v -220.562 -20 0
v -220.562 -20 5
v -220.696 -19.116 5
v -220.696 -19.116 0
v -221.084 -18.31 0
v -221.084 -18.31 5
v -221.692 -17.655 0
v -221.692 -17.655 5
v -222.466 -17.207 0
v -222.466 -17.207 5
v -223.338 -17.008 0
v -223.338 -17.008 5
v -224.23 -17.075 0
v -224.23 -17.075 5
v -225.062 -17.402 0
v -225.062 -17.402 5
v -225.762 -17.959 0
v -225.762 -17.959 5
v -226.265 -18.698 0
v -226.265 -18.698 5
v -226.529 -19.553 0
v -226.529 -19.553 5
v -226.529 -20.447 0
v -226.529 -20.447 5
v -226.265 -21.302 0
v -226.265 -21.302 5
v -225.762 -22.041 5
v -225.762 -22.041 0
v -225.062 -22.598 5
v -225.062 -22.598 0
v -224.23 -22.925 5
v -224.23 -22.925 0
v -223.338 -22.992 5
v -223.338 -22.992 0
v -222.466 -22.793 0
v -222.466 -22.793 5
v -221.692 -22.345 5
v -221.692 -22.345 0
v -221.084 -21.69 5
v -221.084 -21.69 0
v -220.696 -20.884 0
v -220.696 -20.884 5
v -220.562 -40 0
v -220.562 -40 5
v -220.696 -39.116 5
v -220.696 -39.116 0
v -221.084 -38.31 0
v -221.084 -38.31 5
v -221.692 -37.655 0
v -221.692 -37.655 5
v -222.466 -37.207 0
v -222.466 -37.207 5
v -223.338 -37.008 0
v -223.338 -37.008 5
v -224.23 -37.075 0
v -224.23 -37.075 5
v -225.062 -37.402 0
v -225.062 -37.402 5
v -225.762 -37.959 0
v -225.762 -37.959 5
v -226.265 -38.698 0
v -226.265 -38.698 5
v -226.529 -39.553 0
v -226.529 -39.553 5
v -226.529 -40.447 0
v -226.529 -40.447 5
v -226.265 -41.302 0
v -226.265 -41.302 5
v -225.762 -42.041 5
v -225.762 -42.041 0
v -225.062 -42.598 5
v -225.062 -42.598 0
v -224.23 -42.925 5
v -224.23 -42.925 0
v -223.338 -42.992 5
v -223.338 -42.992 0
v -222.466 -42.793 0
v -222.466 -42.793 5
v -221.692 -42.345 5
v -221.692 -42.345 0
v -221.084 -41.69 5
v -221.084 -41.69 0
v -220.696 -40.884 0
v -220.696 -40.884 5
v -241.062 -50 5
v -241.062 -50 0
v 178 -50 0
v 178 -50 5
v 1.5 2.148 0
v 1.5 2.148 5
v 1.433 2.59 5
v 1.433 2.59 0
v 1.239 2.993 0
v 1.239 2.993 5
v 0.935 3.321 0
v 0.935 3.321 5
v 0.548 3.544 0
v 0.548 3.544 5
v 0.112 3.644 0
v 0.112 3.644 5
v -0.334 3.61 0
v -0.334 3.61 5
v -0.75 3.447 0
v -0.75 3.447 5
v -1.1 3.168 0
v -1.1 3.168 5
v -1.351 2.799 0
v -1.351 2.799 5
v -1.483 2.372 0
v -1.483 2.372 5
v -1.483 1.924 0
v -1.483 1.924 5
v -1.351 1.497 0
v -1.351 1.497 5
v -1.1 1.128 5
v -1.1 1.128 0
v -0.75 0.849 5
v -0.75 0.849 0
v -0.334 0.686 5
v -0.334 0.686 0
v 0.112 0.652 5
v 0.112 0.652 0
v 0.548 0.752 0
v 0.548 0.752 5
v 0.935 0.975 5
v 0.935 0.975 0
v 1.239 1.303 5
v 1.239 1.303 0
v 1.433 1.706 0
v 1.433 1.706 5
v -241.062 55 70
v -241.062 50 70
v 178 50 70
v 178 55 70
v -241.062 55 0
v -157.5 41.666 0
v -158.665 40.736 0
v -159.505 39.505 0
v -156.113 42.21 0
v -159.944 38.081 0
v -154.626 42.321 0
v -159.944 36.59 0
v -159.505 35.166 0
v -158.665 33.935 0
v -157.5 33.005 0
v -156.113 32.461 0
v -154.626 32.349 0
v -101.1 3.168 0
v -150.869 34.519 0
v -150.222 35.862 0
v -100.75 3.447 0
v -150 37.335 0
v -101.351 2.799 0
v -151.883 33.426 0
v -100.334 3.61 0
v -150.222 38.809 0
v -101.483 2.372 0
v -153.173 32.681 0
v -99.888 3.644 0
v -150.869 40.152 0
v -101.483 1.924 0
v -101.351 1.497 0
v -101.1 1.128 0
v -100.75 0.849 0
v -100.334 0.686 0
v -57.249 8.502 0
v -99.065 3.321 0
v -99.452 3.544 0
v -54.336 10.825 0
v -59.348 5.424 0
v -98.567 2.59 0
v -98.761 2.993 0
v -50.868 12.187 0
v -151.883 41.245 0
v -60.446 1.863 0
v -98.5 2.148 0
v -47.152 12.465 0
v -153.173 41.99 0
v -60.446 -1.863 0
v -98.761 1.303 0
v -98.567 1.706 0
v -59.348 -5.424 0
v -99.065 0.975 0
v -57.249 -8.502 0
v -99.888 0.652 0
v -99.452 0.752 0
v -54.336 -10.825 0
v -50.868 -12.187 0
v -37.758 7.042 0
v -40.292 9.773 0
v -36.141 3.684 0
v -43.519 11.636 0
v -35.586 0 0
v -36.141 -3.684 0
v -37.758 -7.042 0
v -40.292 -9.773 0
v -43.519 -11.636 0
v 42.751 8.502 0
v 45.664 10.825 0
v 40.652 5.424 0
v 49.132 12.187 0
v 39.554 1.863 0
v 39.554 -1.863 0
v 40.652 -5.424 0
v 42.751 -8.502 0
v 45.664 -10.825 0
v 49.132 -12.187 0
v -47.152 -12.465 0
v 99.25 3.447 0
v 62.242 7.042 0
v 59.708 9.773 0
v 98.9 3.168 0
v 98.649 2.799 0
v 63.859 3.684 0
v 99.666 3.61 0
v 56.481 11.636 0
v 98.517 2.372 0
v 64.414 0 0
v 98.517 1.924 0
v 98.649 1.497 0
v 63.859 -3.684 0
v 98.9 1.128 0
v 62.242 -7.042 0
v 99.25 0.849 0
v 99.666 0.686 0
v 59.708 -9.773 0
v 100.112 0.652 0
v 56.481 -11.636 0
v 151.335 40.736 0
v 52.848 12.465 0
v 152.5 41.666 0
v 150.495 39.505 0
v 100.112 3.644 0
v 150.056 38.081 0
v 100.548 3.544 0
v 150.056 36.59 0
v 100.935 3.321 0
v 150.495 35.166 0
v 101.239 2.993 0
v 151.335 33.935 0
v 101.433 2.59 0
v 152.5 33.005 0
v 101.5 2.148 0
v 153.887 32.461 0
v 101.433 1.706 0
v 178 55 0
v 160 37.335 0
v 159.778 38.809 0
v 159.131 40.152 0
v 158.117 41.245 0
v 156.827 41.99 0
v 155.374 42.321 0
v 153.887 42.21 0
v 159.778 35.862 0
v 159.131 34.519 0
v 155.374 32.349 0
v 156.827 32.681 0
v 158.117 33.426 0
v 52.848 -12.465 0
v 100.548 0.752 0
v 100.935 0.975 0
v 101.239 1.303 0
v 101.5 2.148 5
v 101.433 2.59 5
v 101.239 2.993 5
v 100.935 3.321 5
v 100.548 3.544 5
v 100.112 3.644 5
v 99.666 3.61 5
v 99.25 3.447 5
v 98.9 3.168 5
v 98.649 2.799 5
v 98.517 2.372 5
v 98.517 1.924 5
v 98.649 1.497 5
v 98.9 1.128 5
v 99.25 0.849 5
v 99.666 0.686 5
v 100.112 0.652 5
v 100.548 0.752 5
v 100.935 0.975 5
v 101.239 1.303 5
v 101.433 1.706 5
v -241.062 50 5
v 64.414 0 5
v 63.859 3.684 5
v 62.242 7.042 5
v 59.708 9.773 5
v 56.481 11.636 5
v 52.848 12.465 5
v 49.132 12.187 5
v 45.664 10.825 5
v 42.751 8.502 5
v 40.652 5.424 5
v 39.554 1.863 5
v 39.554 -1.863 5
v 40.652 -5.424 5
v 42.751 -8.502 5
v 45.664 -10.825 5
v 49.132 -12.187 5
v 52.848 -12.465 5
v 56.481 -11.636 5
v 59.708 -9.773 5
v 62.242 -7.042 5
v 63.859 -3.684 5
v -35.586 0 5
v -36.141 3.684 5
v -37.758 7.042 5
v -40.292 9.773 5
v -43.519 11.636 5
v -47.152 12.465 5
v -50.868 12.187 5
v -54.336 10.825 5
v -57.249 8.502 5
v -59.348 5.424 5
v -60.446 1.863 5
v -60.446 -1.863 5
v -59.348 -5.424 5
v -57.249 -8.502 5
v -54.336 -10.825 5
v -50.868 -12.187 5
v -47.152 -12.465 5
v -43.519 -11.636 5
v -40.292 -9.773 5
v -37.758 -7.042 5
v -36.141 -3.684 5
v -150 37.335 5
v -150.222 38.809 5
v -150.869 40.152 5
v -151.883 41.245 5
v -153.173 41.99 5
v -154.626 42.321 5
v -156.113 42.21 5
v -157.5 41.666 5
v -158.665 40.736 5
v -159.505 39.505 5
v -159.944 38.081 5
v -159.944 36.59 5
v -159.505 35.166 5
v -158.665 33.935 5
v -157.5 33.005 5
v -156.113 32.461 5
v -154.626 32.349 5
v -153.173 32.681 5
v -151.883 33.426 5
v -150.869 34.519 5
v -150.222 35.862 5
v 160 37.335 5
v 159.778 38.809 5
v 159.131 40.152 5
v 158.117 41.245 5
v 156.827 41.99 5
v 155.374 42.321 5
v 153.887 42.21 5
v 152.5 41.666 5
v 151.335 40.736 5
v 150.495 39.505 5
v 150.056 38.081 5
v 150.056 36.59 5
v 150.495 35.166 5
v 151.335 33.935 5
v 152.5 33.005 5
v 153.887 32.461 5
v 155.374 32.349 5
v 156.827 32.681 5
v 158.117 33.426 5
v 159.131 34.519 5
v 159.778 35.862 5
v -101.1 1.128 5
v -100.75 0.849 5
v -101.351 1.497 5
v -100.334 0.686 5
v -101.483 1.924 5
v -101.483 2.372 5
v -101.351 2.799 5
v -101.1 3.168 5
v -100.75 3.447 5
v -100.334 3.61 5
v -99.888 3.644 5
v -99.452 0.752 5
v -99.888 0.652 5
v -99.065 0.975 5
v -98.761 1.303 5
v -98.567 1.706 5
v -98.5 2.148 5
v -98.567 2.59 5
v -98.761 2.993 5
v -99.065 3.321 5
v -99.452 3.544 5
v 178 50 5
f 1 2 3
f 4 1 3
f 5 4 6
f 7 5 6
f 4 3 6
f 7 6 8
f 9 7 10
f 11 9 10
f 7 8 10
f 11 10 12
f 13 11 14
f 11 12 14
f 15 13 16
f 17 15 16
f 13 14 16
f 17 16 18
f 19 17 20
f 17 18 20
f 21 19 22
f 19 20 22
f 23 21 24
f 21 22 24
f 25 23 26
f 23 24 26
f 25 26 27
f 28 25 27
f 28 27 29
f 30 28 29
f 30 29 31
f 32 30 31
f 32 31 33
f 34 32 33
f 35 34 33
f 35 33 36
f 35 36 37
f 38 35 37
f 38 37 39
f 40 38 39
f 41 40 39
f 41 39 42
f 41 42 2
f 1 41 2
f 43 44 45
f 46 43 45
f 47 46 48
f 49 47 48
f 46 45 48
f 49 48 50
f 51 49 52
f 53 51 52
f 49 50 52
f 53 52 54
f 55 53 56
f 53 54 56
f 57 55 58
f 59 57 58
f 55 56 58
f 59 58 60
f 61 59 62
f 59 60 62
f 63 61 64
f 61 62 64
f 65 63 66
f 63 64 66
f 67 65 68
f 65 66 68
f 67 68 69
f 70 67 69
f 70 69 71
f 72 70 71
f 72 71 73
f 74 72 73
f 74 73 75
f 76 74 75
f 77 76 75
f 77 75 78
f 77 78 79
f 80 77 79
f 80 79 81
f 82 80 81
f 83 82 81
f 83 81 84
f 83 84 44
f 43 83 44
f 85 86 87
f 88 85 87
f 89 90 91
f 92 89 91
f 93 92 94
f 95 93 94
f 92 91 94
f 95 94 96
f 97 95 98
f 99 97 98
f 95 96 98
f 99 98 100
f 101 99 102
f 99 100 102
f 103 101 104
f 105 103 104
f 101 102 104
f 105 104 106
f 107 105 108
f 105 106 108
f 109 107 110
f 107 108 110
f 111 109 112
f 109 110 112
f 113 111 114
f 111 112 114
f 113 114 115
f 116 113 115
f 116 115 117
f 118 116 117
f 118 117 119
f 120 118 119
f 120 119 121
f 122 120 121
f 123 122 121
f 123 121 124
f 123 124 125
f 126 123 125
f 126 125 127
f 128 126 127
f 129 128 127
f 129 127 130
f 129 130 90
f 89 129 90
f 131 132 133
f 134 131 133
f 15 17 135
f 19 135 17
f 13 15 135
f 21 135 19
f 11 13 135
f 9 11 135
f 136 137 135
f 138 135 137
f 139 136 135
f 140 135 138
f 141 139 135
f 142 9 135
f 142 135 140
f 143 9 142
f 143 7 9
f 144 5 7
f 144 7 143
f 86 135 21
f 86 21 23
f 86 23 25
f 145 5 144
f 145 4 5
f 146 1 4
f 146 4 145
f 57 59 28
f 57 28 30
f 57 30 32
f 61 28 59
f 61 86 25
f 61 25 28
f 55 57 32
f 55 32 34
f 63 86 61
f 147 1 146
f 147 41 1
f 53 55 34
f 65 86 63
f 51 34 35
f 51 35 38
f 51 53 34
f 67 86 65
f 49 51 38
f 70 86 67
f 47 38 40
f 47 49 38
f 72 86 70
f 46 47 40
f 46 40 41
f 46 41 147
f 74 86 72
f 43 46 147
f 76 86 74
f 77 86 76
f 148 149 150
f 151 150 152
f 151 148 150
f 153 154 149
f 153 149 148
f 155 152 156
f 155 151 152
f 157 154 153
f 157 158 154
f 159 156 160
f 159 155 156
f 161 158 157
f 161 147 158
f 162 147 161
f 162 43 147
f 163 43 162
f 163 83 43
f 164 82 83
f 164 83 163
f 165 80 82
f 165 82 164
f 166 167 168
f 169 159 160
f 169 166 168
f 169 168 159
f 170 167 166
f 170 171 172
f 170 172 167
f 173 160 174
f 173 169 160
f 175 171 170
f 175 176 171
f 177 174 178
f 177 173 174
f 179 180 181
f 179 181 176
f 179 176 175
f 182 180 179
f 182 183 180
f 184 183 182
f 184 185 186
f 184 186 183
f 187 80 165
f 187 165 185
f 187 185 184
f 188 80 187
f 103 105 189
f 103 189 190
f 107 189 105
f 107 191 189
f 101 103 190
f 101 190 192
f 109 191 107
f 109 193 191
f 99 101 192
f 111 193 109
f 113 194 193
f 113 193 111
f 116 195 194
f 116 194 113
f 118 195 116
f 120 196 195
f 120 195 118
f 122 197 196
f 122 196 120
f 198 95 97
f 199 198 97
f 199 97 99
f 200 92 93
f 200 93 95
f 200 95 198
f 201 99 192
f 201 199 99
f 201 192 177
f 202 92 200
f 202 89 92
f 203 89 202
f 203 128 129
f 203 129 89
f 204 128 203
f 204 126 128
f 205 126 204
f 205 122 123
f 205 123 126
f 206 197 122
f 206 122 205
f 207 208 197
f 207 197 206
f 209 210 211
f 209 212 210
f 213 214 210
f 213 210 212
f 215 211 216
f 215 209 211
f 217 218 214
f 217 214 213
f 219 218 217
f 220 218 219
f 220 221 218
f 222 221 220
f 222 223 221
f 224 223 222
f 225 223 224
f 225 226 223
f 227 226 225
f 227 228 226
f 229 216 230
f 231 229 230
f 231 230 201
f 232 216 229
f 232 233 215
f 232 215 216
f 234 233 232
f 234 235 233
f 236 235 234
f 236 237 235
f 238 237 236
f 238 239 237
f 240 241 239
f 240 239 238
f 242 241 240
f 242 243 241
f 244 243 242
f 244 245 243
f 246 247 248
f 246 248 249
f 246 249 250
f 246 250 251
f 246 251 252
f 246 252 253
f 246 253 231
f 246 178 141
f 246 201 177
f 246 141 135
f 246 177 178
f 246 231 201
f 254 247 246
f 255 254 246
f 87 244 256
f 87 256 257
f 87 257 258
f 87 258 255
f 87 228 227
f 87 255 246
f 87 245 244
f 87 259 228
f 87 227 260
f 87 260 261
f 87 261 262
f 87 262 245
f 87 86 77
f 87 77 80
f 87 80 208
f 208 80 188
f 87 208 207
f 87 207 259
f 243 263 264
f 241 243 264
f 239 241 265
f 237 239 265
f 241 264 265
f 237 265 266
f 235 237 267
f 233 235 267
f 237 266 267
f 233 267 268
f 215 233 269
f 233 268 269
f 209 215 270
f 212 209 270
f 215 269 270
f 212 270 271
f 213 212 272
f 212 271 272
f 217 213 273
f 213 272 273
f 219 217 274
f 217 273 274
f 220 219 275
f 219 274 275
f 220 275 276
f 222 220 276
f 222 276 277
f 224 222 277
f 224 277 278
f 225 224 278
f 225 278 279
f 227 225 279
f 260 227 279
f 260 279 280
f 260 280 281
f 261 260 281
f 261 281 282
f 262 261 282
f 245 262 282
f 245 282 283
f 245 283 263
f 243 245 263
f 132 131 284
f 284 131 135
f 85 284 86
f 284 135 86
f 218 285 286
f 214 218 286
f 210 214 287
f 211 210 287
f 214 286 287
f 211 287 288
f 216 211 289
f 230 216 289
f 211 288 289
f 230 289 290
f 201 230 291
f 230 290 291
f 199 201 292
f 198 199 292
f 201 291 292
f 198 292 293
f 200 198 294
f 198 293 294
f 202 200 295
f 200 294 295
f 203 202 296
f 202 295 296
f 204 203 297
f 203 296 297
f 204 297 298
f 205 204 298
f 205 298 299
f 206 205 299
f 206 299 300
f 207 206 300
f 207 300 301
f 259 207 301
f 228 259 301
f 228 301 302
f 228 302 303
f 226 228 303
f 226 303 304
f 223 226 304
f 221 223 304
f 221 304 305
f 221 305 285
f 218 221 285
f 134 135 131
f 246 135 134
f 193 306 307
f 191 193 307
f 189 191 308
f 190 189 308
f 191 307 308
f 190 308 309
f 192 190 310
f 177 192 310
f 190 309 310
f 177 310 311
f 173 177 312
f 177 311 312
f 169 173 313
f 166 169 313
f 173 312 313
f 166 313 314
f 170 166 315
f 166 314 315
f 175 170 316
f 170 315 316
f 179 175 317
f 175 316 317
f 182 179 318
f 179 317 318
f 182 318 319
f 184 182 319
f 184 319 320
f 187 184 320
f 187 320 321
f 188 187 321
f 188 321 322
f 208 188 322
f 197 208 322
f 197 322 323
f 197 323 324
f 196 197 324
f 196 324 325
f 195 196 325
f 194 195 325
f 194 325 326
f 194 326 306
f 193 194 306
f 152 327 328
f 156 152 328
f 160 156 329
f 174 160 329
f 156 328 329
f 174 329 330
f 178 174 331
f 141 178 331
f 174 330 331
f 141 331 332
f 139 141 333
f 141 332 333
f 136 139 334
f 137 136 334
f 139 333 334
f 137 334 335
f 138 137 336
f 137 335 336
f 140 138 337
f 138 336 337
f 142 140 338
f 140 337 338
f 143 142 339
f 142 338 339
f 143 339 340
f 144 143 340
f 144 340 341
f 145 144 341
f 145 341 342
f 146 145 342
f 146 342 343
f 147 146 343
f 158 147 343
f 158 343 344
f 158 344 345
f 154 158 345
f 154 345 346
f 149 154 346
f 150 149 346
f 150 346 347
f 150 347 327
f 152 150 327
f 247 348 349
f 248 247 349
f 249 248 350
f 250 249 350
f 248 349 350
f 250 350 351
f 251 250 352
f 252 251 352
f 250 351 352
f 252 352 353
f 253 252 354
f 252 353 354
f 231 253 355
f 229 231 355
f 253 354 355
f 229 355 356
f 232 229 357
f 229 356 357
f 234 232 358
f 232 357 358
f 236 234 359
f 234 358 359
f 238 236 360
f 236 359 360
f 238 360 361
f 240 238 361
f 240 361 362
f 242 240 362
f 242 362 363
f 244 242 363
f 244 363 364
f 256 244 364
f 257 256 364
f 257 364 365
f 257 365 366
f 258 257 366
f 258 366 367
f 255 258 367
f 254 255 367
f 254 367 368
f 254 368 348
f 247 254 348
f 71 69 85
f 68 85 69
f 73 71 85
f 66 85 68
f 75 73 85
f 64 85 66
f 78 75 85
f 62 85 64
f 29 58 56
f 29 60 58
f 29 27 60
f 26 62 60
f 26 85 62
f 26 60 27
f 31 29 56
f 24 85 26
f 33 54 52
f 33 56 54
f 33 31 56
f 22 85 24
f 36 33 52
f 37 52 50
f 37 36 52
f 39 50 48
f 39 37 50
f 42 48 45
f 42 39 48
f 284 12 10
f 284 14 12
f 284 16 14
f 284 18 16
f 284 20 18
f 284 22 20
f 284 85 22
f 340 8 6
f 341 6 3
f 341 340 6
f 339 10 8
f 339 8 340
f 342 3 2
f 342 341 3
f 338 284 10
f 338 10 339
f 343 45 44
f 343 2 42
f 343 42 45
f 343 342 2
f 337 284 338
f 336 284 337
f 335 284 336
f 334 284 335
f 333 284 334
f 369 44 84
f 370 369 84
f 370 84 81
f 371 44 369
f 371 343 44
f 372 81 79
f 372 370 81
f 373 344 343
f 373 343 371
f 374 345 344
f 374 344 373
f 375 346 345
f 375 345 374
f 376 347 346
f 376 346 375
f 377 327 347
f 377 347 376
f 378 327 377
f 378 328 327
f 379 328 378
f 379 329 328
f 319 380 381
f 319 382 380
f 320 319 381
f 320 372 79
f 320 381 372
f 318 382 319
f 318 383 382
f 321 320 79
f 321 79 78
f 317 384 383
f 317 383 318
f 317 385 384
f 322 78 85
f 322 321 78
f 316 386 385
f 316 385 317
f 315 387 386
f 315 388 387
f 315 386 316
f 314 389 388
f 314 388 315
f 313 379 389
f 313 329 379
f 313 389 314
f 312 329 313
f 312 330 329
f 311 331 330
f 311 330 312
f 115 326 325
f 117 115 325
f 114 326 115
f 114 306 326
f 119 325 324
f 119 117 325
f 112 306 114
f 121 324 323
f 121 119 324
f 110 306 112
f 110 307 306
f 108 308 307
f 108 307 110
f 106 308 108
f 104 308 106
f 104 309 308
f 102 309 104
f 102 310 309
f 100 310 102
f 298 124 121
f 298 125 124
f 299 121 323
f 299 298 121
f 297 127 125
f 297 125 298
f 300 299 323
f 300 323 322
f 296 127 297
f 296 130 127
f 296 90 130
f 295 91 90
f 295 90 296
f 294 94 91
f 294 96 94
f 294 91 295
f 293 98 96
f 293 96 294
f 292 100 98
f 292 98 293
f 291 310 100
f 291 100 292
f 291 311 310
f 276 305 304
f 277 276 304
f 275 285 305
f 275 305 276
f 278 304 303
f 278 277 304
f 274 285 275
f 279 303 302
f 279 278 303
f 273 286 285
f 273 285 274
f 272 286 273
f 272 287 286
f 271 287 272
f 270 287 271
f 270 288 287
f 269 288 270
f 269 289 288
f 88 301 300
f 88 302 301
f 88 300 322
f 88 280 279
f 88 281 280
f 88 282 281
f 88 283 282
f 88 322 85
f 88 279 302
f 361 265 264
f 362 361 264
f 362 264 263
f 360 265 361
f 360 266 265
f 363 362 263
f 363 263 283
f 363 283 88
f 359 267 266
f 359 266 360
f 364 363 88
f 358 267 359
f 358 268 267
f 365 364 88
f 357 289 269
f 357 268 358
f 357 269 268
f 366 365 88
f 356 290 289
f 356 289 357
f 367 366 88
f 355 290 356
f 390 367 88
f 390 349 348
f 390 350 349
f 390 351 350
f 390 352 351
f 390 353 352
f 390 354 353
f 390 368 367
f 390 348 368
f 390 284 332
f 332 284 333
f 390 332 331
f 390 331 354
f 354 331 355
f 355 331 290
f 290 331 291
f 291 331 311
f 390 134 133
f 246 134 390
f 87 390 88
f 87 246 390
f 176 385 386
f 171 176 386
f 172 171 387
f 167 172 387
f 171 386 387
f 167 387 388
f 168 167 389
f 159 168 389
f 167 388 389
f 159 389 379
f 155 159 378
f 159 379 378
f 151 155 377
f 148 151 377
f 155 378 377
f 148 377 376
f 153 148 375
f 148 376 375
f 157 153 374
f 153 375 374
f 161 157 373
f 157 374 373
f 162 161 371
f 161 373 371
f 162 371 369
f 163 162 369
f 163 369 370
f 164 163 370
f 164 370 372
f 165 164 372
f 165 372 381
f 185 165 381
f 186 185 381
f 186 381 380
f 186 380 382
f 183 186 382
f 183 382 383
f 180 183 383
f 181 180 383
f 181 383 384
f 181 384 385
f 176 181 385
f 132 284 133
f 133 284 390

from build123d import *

# Parameters (mm, degrees)
F0_W      = 356
F0_H      = 100
F1_DEPTH  = 5
F2_R      = 5
F2_R_2    = 12.5
F3_DEPTH  = 5.001
F4_R      = 1.5
F5_DEPTH  = 5.001
F6_W      = 49.406879
F6_H      = 21.095738
F7_DEPTH  = 25
F9_W      = 63.062
F9_H      = 100
F10_DEPTH = 5
F11_R     = 3
F12_DEPTH = 25
F13_W     = 419.062
F13_H     = 5
F14_DEPTH = 70


with BuildPart() as f1:
    # F0 (on Top) → F1 (new body)
    with BuildSketch(Plane.XY):
        Rectangle(F0_W, F0_H)
    extrude(amount=F1_DEPTH)

    # F2 (on face) → F3 (cut, through all)
    with BuildSketch(Plane.XY.offset(5)):
        with Locations((-155, 37.335402)):
            Circle(F2_R)
        with Locations((155, 37.335402)):
            Circle(F2_R)
        with Locations((-48.086096, 0)):
            Circle(F2_R_2)
        with Locations((51.913904, 0)):
            Circle(F2_R_2)
    extrude(amount=-F3_DEPTH, mode=Mode.SUBTRACT)

    # F4 (on face) → F5 (cut, through all)
    with BuildSketch(Plane.XY.offset(5)):
        with Locations((0, 2.148001)):
            Circle(F4_R)
        with Locations((100, 2.148001)):
            Circle(F4_R)
        with Locations((-100, 2.148001)):
            Circle(F4_R)
    extrude(amount=-F5_DEPTH, mode=Mode.SUBTRACT)

    # F9 (on Top) → F10 (join, through all)
    with BuildSketch(Plane.XY):
        with Locations((-209.531, 0)):
            Rectangle(F9_W, F9_H)
    extrude(amount=F10_DEPTH)

    # F11 (on face) → F12 (cut)
    with BuildSketch(Plane.XY.offset(5)):
        with Locations((-223.56236, -20)):
            Circle(F11_R)
        with Locations((-223.56236, -40)):
            Circle(F11_R)
    extrude(amount=-F12_DEPTH, mode=Mode.SUBTRACT)

    # F13 (on face) → F14 (join)
    with BuildSketch(Plane(origin=(0, 0, 0), x_dir=(1, 0, 0), z_dir=(0, 0, -1))):
        with Locations((-31.531, -52.5)):
            Rectangle(F13_W, F13_H)
    extrude(amount=-F14_DEPTH)


with BuildPart() as f7:
    # F6 (on Top) → F7 (new body)
    with BuildSketch(Plane.XY):
        with Locations((37.024449, 48.380569)):
            Rectangle(F6_W, F6_H)
    extrude(amount=F7_DEPTH)


solid = f1.part
